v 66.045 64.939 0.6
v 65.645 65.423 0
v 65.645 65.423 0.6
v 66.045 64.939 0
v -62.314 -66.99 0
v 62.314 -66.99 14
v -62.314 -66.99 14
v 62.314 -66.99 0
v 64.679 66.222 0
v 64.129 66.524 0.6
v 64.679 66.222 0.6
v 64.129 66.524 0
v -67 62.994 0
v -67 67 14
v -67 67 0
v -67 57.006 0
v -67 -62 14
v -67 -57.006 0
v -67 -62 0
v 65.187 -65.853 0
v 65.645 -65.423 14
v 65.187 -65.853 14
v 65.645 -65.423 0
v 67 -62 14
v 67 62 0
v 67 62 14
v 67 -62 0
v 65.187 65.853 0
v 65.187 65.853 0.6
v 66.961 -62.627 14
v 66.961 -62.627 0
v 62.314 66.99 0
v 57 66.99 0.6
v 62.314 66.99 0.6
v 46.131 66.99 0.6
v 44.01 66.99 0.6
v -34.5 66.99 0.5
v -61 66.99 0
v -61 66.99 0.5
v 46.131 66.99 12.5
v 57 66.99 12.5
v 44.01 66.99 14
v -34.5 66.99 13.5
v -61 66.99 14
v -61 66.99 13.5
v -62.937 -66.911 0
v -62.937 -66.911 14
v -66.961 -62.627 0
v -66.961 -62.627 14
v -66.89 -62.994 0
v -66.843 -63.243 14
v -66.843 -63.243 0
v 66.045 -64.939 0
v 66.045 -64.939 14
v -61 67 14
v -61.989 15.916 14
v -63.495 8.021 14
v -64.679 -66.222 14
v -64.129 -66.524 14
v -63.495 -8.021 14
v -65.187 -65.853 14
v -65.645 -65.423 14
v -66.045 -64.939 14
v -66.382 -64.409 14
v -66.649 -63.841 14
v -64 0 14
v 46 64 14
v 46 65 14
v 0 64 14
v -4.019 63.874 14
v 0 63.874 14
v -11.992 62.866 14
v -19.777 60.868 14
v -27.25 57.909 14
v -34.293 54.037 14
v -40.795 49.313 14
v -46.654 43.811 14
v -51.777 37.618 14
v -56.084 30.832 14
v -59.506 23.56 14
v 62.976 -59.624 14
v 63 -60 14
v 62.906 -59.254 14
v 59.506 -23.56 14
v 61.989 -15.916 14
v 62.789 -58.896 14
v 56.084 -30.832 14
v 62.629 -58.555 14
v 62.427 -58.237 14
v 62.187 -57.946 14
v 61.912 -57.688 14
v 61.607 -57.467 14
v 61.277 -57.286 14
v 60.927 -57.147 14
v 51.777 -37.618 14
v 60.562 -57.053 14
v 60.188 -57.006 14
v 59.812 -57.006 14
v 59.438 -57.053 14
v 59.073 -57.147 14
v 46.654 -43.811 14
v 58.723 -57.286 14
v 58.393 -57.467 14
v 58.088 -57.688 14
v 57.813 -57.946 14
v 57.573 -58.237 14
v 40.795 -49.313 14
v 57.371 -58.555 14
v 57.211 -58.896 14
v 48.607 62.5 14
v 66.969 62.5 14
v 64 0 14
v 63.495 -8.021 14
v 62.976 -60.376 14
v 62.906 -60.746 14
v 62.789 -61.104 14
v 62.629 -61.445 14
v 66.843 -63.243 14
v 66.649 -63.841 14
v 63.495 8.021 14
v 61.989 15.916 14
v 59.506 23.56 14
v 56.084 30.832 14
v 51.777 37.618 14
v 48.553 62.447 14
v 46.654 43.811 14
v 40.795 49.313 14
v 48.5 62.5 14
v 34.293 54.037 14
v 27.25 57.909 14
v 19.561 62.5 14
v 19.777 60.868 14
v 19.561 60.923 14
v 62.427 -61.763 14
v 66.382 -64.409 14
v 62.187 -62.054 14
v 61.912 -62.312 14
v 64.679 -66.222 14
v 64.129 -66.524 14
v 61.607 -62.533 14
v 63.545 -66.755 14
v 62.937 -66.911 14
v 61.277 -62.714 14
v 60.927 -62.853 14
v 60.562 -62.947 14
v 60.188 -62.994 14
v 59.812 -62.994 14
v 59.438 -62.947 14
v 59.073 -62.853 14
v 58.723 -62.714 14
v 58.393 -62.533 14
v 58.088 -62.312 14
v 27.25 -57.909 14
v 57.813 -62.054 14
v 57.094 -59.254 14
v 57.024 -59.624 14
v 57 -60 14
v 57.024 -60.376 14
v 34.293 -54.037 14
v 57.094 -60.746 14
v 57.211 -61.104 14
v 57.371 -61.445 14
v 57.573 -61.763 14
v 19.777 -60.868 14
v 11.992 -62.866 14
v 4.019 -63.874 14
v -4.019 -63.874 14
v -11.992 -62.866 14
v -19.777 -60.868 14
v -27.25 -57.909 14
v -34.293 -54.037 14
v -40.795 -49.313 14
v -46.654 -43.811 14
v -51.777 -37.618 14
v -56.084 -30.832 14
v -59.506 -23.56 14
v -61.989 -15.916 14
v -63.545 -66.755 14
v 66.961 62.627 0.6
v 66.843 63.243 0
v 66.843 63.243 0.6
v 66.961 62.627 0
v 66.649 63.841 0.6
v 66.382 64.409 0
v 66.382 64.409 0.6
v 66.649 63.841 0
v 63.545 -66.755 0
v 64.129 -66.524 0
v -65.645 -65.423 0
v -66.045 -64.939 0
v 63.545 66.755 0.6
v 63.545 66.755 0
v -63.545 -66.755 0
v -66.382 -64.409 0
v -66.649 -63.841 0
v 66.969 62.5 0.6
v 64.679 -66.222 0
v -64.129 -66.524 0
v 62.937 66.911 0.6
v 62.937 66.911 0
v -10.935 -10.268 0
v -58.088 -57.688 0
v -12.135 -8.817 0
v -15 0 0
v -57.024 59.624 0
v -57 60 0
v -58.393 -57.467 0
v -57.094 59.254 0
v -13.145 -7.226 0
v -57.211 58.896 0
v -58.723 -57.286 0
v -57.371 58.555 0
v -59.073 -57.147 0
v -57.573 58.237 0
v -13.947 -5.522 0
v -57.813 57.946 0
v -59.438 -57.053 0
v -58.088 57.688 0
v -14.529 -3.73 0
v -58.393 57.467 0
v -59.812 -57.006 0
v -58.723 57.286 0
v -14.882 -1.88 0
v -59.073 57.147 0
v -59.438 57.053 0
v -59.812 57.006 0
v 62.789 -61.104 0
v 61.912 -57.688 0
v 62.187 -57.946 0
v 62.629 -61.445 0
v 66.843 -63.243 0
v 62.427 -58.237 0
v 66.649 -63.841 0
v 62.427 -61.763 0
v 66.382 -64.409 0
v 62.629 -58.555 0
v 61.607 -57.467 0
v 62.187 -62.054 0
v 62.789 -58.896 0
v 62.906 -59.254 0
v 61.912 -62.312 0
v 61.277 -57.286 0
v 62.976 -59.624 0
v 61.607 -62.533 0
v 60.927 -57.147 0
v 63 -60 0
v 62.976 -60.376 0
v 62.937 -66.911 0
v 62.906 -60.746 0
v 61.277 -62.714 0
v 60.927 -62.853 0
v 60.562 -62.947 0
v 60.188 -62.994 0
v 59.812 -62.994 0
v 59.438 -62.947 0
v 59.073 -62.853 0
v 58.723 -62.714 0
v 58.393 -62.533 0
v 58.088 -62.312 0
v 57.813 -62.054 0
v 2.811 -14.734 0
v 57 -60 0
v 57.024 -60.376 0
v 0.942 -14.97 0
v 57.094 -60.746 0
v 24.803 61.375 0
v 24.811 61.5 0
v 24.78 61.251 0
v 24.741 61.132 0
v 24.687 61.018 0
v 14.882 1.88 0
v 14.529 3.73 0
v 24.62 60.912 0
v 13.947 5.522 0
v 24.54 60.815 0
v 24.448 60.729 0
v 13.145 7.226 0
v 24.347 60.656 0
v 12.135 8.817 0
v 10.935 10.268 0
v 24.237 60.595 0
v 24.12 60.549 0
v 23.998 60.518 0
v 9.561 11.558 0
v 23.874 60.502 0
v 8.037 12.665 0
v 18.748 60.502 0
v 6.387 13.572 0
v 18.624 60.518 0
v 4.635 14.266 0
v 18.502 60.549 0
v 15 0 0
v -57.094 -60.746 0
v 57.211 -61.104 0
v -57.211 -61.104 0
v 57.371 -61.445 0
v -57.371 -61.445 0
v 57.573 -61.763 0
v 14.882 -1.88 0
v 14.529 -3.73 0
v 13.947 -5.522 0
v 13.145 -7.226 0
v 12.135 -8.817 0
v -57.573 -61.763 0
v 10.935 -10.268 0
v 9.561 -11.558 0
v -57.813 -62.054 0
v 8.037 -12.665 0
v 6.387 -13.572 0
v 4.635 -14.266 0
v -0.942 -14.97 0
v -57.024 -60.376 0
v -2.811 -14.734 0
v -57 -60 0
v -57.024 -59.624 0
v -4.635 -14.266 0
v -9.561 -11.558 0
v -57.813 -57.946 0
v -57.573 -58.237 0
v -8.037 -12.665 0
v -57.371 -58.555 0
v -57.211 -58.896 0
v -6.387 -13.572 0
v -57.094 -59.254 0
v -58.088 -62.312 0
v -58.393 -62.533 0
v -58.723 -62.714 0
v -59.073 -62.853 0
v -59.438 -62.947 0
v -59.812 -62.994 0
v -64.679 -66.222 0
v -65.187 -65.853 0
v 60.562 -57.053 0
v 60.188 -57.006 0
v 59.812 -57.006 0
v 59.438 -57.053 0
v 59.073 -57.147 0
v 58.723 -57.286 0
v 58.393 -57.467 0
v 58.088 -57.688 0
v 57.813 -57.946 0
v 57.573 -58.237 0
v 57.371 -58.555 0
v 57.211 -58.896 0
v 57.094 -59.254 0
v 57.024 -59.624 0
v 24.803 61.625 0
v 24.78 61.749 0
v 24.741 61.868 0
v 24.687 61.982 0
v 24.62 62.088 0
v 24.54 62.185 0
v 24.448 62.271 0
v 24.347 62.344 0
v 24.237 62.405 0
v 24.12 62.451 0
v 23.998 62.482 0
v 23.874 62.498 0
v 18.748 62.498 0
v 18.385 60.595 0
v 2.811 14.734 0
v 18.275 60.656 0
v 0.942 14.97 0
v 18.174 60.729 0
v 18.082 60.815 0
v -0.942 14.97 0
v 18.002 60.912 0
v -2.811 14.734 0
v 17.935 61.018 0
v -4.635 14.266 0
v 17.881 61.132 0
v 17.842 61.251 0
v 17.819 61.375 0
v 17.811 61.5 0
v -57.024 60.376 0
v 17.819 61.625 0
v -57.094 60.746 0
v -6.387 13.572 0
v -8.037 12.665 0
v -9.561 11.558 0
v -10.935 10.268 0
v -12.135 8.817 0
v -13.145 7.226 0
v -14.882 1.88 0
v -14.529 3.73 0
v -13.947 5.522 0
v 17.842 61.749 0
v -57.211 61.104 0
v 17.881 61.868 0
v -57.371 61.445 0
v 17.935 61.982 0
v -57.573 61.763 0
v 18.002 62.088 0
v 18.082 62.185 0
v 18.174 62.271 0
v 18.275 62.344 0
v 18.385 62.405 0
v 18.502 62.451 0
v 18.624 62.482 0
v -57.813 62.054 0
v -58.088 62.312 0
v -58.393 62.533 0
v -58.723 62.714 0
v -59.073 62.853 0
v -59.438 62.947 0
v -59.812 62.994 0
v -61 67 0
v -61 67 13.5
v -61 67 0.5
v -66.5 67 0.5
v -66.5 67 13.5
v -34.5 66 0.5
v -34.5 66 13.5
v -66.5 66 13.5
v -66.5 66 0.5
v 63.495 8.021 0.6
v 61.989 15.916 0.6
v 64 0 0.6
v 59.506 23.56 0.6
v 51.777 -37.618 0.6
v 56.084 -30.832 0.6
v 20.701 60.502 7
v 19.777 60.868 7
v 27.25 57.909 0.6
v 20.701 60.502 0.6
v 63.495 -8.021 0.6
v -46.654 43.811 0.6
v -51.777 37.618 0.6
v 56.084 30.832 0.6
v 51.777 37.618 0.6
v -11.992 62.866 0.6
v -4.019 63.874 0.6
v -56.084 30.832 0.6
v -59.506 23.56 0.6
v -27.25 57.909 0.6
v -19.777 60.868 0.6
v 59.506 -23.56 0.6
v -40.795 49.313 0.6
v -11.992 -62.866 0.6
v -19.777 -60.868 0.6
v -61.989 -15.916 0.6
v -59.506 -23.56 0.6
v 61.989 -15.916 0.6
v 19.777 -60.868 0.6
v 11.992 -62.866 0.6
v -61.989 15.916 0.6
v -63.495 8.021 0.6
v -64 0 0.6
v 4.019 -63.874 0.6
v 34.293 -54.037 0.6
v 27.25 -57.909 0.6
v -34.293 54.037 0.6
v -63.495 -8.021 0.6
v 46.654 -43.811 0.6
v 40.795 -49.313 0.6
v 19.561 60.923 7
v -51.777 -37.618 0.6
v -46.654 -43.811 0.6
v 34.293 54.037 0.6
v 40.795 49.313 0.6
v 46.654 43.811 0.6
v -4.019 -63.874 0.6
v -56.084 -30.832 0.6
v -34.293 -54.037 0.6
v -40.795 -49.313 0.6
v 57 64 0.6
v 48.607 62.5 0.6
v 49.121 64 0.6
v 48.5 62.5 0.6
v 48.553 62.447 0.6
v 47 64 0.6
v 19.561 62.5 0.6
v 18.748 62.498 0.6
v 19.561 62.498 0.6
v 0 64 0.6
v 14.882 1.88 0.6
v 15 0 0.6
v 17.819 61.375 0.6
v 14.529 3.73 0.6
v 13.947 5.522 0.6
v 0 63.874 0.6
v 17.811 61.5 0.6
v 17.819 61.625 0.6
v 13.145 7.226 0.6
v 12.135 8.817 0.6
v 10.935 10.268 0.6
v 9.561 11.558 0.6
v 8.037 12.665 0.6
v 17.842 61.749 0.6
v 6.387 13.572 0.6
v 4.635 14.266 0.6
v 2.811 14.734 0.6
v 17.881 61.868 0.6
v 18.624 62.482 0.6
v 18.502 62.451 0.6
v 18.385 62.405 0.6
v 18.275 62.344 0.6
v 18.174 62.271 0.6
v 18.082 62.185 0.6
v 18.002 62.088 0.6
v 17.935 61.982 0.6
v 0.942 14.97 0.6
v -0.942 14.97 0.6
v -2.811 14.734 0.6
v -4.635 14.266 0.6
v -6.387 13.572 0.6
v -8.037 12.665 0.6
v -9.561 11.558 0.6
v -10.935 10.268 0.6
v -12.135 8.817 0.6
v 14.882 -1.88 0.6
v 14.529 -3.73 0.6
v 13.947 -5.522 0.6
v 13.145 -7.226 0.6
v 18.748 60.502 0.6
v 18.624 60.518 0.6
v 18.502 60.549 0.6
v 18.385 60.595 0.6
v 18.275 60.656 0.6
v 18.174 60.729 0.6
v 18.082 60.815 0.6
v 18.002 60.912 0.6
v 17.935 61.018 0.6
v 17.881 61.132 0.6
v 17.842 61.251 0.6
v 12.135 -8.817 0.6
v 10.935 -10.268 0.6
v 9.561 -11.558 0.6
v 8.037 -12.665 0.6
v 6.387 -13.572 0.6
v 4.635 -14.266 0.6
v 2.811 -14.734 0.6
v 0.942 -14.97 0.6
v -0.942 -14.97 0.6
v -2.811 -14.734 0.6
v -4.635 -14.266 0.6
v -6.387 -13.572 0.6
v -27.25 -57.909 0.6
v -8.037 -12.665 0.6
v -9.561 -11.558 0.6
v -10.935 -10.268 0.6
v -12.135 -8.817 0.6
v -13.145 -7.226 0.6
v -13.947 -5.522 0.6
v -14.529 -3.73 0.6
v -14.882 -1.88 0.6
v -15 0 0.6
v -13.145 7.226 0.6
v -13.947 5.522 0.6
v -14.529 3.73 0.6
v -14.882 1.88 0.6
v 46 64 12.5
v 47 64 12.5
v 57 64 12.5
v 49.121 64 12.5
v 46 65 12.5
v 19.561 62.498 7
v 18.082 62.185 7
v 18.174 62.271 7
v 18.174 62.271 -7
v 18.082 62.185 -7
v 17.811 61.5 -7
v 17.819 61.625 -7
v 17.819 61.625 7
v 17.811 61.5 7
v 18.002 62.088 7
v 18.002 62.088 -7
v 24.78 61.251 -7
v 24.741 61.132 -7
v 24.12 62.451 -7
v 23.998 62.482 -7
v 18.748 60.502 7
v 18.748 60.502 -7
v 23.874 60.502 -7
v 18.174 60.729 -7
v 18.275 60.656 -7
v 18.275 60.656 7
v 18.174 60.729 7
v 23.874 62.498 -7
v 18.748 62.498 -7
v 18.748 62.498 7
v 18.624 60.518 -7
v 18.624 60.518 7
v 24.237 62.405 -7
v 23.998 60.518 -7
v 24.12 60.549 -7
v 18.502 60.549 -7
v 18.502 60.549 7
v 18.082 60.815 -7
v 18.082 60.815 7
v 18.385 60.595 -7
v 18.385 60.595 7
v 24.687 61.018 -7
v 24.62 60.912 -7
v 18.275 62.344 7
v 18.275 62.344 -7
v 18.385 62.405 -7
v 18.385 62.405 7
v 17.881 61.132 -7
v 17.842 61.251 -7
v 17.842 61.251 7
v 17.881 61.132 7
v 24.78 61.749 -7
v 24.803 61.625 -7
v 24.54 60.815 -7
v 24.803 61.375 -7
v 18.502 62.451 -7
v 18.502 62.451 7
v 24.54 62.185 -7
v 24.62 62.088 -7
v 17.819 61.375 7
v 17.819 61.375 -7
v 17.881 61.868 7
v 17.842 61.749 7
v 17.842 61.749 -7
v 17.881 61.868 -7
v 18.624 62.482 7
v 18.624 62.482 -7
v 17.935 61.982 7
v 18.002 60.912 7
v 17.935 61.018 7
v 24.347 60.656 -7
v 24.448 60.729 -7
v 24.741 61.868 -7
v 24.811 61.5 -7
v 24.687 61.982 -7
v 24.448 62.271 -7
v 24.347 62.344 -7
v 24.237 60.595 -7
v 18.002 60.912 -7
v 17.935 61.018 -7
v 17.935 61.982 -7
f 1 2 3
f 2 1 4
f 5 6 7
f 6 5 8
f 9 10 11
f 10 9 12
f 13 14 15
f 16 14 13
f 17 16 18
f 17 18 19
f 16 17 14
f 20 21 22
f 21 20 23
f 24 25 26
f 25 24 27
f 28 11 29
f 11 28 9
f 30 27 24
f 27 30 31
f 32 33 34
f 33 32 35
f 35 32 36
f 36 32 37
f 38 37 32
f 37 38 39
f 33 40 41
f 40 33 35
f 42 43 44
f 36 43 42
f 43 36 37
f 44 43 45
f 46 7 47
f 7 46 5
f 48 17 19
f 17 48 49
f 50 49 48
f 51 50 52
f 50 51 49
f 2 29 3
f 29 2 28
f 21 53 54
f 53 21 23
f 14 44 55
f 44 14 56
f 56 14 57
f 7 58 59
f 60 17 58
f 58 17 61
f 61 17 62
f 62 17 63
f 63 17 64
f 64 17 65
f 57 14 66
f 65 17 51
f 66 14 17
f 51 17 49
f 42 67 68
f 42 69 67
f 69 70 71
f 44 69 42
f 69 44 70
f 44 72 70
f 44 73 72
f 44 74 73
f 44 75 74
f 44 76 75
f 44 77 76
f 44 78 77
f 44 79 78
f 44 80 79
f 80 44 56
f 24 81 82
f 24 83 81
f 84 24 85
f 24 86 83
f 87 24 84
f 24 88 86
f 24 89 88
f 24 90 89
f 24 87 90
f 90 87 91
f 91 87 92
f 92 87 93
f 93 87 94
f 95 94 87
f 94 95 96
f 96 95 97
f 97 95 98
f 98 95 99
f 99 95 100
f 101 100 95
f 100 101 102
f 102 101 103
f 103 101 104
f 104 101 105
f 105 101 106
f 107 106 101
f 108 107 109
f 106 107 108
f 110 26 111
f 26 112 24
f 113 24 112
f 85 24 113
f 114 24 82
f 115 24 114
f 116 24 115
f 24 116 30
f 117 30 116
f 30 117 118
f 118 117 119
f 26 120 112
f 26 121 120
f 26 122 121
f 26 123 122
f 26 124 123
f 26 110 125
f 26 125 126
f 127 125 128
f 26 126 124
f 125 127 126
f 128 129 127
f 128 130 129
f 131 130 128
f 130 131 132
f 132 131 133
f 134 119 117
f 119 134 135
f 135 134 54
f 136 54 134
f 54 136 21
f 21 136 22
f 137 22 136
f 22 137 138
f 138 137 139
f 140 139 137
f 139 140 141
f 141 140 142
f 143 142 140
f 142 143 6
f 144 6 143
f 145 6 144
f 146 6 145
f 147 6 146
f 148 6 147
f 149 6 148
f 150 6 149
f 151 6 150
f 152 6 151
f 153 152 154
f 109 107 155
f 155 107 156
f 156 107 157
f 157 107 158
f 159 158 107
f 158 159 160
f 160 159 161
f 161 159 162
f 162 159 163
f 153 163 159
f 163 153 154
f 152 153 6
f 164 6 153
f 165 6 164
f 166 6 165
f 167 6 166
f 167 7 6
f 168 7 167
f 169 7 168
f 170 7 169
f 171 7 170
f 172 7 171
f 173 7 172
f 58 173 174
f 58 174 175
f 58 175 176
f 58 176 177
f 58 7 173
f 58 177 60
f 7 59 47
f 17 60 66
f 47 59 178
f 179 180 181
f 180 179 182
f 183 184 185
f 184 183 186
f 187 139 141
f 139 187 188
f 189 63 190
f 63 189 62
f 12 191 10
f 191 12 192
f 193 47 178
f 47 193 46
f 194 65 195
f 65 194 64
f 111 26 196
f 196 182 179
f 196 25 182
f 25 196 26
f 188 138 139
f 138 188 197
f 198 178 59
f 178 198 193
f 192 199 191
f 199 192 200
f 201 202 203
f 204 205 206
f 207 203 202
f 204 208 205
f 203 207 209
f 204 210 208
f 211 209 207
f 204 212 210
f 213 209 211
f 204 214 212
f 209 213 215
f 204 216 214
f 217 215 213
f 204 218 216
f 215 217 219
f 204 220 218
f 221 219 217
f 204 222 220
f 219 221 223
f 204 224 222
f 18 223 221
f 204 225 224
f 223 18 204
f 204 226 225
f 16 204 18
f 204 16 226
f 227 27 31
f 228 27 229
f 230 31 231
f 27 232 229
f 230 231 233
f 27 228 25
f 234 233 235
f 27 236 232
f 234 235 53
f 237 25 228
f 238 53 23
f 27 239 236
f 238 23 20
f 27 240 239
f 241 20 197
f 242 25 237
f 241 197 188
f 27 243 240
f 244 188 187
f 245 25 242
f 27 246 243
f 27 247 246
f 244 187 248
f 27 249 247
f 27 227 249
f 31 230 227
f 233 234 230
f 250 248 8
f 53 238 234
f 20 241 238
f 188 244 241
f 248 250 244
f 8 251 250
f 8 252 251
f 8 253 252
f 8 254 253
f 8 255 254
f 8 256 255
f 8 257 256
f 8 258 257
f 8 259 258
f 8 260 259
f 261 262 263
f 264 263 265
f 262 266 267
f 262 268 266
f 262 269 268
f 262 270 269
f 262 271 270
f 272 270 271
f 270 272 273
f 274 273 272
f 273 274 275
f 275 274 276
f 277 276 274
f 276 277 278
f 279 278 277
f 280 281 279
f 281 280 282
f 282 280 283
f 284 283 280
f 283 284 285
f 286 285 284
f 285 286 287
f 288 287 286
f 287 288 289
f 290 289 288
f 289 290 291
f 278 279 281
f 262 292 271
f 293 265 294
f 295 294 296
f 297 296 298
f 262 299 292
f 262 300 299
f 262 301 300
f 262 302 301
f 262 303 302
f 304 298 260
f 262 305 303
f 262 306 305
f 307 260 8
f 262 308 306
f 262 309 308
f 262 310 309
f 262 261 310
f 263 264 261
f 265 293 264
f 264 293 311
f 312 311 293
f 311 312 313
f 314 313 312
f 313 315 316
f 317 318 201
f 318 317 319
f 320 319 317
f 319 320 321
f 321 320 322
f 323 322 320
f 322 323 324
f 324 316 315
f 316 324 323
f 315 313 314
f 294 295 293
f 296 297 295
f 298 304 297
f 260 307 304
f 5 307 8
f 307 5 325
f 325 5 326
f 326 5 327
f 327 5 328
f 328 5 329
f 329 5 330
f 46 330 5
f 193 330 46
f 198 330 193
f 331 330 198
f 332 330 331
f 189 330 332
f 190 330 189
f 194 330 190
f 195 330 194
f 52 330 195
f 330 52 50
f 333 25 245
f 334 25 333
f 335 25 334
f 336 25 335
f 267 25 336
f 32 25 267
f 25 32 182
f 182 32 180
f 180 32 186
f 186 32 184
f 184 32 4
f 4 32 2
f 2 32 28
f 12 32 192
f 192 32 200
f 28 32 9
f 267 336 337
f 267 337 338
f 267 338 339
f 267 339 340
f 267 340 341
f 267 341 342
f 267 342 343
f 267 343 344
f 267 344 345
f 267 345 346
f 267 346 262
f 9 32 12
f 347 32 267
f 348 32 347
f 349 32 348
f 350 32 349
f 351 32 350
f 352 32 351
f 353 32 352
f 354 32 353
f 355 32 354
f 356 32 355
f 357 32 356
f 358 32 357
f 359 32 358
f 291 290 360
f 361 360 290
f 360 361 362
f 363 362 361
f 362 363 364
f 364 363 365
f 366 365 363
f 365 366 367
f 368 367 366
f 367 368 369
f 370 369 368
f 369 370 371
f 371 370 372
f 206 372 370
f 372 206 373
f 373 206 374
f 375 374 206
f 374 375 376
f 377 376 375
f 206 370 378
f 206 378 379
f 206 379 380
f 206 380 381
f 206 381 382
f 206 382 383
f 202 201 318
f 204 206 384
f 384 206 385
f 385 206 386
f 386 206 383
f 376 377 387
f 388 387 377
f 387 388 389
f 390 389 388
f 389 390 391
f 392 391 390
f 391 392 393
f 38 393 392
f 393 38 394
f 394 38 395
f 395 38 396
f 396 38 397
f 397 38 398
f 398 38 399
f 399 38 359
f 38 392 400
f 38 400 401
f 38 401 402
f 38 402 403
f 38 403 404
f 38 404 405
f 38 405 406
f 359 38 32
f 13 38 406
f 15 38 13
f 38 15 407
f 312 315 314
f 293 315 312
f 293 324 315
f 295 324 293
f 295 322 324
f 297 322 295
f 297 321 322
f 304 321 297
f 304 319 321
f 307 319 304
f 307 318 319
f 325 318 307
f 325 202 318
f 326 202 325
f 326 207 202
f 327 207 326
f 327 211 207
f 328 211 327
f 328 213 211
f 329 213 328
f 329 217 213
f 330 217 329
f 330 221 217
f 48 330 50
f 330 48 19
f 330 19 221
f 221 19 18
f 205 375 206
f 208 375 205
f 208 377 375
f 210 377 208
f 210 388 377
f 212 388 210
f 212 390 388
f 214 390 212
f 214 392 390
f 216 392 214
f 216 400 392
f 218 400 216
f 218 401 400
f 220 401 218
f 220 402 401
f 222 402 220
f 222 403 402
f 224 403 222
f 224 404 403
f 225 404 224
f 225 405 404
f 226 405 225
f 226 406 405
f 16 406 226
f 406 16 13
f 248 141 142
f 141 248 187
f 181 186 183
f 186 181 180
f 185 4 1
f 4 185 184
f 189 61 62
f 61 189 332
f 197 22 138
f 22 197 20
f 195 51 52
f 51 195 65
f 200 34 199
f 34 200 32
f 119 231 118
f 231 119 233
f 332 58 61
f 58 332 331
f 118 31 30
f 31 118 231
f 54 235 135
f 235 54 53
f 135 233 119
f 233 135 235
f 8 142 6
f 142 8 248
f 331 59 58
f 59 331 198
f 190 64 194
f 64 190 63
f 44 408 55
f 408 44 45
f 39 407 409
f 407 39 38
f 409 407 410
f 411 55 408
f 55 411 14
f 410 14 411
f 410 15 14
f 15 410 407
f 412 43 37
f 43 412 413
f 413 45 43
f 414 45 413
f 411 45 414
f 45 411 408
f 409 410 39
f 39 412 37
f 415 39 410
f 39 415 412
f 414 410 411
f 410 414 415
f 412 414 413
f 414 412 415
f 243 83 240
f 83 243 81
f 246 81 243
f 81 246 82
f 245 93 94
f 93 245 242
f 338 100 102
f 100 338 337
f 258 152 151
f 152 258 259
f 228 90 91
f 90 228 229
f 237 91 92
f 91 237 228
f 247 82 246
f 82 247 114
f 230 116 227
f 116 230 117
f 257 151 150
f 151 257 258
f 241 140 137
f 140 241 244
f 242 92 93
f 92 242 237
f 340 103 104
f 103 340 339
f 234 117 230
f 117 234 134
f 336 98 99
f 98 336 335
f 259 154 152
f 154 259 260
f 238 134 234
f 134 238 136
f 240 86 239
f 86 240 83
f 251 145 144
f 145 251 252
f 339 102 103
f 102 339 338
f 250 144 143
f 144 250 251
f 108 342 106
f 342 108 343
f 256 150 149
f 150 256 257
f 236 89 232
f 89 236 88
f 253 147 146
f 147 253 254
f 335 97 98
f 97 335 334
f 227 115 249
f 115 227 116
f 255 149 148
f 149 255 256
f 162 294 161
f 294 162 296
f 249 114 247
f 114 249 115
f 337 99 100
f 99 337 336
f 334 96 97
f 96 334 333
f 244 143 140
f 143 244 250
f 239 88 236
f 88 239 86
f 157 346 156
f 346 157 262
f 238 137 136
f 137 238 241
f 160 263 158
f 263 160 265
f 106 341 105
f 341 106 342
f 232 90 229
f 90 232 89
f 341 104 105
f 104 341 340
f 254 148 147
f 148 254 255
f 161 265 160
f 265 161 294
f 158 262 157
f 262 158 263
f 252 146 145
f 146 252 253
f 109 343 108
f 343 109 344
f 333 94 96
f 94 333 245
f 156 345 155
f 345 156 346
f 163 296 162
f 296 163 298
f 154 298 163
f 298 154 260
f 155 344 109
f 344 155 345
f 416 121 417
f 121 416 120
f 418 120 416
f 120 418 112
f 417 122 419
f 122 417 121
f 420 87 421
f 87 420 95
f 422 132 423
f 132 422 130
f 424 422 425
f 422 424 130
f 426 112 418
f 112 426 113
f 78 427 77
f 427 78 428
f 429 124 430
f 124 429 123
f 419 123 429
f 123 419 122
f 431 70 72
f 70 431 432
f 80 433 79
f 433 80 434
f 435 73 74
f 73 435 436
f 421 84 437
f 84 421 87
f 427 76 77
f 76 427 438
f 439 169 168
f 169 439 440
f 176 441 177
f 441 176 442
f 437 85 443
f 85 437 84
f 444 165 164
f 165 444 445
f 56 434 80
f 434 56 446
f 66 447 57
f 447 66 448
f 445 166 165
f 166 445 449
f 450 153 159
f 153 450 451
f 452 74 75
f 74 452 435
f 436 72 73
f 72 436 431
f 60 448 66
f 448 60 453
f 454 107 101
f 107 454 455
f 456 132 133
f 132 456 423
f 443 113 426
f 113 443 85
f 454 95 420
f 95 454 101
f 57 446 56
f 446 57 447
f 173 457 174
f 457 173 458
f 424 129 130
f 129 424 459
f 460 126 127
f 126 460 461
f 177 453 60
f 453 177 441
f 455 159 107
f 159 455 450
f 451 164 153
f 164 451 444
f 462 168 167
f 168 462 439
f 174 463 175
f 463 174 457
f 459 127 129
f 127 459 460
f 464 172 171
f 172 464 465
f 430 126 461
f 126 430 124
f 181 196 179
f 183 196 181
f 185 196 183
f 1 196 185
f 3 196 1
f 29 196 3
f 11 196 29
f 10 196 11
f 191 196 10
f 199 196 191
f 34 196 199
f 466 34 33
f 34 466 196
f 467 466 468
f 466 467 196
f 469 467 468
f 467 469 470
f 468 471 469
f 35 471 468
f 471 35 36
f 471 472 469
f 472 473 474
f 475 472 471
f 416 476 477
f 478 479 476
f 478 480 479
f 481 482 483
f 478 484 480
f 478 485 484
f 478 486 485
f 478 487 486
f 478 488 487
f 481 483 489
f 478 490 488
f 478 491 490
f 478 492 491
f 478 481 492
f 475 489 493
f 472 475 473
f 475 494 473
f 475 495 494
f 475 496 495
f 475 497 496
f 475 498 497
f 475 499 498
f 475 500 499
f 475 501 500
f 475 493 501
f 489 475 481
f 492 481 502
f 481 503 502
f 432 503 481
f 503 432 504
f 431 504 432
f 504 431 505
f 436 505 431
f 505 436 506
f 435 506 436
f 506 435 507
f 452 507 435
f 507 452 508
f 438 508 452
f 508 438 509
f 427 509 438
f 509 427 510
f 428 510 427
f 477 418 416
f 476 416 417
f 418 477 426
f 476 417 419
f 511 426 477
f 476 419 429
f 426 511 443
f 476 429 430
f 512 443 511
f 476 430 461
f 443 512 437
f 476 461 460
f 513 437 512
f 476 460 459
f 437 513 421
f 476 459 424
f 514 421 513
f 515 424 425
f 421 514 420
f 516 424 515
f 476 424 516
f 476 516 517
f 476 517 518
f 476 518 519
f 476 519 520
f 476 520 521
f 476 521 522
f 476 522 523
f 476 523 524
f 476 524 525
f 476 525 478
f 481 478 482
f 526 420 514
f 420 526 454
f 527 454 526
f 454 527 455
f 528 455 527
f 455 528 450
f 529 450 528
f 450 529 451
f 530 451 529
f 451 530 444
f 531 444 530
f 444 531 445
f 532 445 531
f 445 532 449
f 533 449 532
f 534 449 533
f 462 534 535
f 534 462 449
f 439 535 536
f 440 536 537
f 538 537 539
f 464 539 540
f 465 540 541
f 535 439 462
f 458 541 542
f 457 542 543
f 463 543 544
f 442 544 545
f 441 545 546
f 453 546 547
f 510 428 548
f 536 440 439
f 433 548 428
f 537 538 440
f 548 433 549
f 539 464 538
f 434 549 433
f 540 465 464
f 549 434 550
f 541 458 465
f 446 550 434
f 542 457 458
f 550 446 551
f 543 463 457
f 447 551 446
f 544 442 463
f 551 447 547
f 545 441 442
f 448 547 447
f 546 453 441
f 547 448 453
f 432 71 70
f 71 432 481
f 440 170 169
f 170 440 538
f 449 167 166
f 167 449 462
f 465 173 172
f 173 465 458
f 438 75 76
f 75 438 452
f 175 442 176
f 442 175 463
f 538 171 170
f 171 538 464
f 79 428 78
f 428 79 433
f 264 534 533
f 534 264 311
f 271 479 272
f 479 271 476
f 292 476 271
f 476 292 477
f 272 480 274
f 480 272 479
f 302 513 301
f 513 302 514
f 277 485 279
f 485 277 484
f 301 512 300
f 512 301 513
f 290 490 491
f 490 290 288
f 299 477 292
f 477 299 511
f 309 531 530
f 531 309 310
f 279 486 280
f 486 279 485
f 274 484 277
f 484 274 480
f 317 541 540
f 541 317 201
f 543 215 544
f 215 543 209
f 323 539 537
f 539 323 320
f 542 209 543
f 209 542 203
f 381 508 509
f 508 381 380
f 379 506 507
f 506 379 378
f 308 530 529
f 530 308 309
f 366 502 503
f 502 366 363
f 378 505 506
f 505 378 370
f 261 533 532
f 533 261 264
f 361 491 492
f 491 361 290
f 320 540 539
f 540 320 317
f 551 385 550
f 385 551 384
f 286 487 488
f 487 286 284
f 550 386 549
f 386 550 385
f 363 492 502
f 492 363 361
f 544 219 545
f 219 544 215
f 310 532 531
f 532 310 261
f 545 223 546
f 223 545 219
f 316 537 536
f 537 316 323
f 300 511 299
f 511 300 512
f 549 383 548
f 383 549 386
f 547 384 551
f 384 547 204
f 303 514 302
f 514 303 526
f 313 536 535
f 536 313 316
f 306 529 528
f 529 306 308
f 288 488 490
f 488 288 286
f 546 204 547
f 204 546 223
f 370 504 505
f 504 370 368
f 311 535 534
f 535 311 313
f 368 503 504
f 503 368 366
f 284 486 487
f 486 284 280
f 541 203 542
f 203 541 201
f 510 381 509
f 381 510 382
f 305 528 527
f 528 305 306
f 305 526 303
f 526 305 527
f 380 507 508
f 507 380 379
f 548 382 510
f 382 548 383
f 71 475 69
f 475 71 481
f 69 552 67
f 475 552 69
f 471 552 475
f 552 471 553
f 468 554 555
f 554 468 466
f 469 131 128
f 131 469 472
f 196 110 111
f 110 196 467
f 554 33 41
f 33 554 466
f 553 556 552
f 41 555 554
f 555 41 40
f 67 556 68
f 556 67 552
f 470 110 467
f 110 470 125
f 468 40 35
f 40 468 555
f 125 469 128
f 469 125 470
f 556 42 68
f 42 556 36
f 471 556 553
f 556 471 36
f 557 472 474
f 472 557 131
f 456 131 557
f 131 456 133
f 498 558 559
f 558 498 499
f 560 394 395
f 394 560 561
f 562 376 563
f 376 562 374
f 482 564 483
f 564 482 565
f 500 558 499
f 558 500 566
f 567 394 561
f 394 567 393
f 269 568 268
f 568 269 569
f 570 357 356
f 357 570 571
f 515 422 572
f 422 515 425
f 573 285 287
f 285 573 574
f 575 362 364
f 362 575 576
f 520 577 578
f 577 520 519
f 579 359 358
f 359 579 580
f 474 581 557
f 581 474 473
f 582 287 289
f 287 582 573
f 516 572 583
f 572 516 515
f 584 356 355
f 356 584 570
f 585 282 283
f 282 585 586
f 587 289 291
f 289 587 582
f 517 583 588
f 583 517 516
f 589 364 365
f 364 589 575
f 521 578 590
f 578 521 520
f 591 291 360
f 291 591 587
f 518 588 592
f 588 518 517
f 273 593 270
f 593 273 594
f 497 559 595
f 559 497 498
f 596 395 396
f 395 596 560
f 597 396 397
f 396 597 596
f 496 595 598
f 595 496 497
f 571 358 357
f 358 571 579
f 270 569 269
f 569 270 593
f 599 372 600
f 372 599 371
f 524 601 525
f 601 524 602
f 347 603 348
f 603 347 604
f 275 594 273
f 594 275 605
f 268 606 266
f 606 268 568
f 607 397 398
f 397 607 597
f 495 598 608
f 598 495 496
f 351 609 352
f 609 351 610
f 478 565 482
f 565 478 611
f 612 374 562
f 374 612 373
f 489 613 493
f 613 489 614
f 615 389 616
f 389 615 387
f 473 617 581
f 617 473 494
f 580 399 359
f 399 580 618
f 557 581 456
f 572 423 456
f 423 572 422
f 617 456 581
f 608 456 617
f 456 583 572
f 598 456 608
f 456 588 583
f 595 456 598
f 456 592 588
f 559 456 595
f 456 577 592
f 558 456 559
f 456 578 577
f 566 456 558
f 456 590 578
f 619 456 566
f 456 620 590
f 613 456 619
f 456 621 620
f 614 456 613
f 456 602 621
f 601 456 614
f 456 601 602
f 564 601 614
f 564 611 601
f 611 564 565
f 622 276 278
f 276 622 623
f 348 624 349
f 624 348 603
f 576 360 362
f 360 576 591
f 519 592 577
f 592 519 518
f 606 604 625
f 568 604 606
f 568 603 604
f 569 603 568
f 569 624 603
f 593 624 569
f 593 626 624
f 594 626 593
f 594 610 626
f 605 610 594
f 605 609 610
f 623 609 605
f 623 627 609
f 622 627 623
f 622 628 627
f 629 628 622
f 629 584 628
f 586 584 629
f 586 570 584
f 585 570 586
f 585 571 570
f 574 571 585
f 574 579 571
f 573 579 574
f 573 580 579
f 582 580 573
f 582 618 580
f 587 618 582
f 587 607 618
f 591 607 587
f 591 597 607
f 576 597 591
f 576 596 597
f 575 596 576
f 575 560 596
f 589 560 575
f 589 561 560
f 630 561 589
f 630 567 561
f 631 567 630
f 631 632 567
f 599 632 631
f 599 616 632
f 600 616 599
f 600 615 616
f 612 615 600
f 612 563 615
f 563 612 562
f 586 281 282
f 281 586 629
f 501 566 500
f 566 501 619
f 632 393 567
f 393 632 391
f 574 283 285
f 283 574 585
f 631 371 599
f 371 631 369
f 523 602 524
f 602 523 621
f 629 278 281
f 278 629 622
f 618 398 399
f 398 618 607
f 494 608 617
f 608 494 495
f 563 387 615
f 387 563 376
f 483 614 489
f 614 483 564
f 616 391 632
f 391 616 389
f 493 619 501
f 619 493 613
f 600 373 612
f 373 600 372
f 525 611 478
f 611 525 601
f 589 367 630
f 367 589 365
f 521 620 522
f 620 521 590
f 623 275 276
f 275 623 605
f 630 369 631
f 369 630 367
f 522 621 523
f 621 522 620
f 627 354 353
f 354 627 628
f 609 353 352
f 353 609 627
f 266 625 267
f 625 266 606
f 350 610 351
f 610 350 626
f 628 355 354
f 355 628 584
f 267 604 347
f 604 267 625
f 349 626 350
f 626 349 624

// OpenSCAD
$fn = 50;


union() {
	difference() {
		union() {
			hull() {
				translate(v = [-62.0000000000, 62.0000000000, 0]) {
					cylinder(h = 14, r = 5);
				}
				translate(v = [62.0000000000, 62.0000000000, 0]) {
					cylinder(h = 14, r = 5);
				}
				translate(v = [-62.0000000000, -62.0000000000, 0]) {
					cylinder(h = 14, r = 5);
				}
				translate(v = [62.0000000000, -62.0000000000, 0]) {
					cylinder(h = 14, r = 5);
				}
			}
			translate(v = [-67.0000000000, 61.0000000000, 0]) {
				cube(size = [6, 6, 14]);
			}
		}
		union() {
			translate(v = [-67.5000000000, -60.0000000000, -250.0000000000]) {
				rotate(a = [0, 0, 0]) {
					difference() {
						union() {
							hull() {
								translate(v = [7.5000000000, 0, 0]) {
									cylinder(h = 250, r = 3.0000000000, r1 = 3.0000000000, r2 = 3.0000000000);
								}
								translate(v = [-7.5000000000, 0, 0]) {
									cylinder(h = 250, r = 3.0000000000, r1 = 3.0000000000, r2 = 3.0000000000);
								}
							}
						}
						union();
					}
				}
			}
			translate(v = [-67.5000000000, 60.0000000000, -250.0000000000]) {
				rotate(a = [0, 0, 0]) {
					difference() {
						union() {
							hull() {
								translate(v = [7.5000000000, 0, 0]) {
									cylinder(h = 250, r = 3.0000000000, r1 = 3.0000000000, r2 = 3.0000000000);
								}
								translate(v = [-7.5000000000, 0, 0]) {
									cylinder(h = 250, r = 3.0000000000, r1 = 3.0000000000, r2 = 3.0000000000);
								}
							}
						}
						union();
					}
				}
			}
			translate(v = [-66.5000000000, 66.0000000000, 0.5000000000]) {
				cube(size = [32, 1, 13.0000000000]);
			}
			translate(v = [60.0000000000, -60.0000000000, 0]) {
				cylinder(h = 100, r = 3.0000000000);
			}
			translate(v = [0, 0, 0.6000000000]) {
				cylinder(h = 16.4000000000, r = 64.0000000000);
			}
			translate(v = [0, 0, -7.0000000000]) {
				cylinder(h = 14, r = 15.0000000000);
			}
			translate(v = [0.0000000000, 62.5000000000, 0.6000000000]) {
				cube(size = [67.0000000000, 1.5000000000, 16.4000000000]);
			}
			translate(v = [57.0000000000, 62.5000000000, 0.6000000000]) {
				cube(size = [10, 4.5000000000, 16.4000000000]);
			}
			translate(v = [46.0000000000, 62.5000000000, 12.5000000000]) {
				cube(size = [21, 4.5000000000, 1.5000000000]);
			}
			translate(v = [43.2500000000, 67.7500000000, 0.6000000000]) {
				rotate(a = [0, 0, -45]) {
					cube(size = [7.5000000000, 1.5000000000, 16.4000000000]);
				}
			}
			translate(v = [12.0610000000, 60.5000000000, 0.6000000000]) {
				cube(size = [7.5000000000, 2, 13.4000000000]);
			}
		}
	}
	union() {
		translate(v = [21.3110000000, 61.5000000000, -7.0000000000]) {
			rotate(a = [0, 0, 0]) {
				difference() {
					union() {
						#hull() {
							#translate(v = [2.5000000000, 0, 0]) {
								cylinder(h = 14, r = 1.0000000000, r1 = 1.0000000000, r2 = 1.0000000000);
							}
							#translate(v = [-2.5000000000, 0, 0]) {
								cylinder(h = 14, r = 1.0000000000, r1 = 1.0000000000, r2 = 1.0000000000);
							}
						}
					}
					union();
				}
			}
		}
	}
}
